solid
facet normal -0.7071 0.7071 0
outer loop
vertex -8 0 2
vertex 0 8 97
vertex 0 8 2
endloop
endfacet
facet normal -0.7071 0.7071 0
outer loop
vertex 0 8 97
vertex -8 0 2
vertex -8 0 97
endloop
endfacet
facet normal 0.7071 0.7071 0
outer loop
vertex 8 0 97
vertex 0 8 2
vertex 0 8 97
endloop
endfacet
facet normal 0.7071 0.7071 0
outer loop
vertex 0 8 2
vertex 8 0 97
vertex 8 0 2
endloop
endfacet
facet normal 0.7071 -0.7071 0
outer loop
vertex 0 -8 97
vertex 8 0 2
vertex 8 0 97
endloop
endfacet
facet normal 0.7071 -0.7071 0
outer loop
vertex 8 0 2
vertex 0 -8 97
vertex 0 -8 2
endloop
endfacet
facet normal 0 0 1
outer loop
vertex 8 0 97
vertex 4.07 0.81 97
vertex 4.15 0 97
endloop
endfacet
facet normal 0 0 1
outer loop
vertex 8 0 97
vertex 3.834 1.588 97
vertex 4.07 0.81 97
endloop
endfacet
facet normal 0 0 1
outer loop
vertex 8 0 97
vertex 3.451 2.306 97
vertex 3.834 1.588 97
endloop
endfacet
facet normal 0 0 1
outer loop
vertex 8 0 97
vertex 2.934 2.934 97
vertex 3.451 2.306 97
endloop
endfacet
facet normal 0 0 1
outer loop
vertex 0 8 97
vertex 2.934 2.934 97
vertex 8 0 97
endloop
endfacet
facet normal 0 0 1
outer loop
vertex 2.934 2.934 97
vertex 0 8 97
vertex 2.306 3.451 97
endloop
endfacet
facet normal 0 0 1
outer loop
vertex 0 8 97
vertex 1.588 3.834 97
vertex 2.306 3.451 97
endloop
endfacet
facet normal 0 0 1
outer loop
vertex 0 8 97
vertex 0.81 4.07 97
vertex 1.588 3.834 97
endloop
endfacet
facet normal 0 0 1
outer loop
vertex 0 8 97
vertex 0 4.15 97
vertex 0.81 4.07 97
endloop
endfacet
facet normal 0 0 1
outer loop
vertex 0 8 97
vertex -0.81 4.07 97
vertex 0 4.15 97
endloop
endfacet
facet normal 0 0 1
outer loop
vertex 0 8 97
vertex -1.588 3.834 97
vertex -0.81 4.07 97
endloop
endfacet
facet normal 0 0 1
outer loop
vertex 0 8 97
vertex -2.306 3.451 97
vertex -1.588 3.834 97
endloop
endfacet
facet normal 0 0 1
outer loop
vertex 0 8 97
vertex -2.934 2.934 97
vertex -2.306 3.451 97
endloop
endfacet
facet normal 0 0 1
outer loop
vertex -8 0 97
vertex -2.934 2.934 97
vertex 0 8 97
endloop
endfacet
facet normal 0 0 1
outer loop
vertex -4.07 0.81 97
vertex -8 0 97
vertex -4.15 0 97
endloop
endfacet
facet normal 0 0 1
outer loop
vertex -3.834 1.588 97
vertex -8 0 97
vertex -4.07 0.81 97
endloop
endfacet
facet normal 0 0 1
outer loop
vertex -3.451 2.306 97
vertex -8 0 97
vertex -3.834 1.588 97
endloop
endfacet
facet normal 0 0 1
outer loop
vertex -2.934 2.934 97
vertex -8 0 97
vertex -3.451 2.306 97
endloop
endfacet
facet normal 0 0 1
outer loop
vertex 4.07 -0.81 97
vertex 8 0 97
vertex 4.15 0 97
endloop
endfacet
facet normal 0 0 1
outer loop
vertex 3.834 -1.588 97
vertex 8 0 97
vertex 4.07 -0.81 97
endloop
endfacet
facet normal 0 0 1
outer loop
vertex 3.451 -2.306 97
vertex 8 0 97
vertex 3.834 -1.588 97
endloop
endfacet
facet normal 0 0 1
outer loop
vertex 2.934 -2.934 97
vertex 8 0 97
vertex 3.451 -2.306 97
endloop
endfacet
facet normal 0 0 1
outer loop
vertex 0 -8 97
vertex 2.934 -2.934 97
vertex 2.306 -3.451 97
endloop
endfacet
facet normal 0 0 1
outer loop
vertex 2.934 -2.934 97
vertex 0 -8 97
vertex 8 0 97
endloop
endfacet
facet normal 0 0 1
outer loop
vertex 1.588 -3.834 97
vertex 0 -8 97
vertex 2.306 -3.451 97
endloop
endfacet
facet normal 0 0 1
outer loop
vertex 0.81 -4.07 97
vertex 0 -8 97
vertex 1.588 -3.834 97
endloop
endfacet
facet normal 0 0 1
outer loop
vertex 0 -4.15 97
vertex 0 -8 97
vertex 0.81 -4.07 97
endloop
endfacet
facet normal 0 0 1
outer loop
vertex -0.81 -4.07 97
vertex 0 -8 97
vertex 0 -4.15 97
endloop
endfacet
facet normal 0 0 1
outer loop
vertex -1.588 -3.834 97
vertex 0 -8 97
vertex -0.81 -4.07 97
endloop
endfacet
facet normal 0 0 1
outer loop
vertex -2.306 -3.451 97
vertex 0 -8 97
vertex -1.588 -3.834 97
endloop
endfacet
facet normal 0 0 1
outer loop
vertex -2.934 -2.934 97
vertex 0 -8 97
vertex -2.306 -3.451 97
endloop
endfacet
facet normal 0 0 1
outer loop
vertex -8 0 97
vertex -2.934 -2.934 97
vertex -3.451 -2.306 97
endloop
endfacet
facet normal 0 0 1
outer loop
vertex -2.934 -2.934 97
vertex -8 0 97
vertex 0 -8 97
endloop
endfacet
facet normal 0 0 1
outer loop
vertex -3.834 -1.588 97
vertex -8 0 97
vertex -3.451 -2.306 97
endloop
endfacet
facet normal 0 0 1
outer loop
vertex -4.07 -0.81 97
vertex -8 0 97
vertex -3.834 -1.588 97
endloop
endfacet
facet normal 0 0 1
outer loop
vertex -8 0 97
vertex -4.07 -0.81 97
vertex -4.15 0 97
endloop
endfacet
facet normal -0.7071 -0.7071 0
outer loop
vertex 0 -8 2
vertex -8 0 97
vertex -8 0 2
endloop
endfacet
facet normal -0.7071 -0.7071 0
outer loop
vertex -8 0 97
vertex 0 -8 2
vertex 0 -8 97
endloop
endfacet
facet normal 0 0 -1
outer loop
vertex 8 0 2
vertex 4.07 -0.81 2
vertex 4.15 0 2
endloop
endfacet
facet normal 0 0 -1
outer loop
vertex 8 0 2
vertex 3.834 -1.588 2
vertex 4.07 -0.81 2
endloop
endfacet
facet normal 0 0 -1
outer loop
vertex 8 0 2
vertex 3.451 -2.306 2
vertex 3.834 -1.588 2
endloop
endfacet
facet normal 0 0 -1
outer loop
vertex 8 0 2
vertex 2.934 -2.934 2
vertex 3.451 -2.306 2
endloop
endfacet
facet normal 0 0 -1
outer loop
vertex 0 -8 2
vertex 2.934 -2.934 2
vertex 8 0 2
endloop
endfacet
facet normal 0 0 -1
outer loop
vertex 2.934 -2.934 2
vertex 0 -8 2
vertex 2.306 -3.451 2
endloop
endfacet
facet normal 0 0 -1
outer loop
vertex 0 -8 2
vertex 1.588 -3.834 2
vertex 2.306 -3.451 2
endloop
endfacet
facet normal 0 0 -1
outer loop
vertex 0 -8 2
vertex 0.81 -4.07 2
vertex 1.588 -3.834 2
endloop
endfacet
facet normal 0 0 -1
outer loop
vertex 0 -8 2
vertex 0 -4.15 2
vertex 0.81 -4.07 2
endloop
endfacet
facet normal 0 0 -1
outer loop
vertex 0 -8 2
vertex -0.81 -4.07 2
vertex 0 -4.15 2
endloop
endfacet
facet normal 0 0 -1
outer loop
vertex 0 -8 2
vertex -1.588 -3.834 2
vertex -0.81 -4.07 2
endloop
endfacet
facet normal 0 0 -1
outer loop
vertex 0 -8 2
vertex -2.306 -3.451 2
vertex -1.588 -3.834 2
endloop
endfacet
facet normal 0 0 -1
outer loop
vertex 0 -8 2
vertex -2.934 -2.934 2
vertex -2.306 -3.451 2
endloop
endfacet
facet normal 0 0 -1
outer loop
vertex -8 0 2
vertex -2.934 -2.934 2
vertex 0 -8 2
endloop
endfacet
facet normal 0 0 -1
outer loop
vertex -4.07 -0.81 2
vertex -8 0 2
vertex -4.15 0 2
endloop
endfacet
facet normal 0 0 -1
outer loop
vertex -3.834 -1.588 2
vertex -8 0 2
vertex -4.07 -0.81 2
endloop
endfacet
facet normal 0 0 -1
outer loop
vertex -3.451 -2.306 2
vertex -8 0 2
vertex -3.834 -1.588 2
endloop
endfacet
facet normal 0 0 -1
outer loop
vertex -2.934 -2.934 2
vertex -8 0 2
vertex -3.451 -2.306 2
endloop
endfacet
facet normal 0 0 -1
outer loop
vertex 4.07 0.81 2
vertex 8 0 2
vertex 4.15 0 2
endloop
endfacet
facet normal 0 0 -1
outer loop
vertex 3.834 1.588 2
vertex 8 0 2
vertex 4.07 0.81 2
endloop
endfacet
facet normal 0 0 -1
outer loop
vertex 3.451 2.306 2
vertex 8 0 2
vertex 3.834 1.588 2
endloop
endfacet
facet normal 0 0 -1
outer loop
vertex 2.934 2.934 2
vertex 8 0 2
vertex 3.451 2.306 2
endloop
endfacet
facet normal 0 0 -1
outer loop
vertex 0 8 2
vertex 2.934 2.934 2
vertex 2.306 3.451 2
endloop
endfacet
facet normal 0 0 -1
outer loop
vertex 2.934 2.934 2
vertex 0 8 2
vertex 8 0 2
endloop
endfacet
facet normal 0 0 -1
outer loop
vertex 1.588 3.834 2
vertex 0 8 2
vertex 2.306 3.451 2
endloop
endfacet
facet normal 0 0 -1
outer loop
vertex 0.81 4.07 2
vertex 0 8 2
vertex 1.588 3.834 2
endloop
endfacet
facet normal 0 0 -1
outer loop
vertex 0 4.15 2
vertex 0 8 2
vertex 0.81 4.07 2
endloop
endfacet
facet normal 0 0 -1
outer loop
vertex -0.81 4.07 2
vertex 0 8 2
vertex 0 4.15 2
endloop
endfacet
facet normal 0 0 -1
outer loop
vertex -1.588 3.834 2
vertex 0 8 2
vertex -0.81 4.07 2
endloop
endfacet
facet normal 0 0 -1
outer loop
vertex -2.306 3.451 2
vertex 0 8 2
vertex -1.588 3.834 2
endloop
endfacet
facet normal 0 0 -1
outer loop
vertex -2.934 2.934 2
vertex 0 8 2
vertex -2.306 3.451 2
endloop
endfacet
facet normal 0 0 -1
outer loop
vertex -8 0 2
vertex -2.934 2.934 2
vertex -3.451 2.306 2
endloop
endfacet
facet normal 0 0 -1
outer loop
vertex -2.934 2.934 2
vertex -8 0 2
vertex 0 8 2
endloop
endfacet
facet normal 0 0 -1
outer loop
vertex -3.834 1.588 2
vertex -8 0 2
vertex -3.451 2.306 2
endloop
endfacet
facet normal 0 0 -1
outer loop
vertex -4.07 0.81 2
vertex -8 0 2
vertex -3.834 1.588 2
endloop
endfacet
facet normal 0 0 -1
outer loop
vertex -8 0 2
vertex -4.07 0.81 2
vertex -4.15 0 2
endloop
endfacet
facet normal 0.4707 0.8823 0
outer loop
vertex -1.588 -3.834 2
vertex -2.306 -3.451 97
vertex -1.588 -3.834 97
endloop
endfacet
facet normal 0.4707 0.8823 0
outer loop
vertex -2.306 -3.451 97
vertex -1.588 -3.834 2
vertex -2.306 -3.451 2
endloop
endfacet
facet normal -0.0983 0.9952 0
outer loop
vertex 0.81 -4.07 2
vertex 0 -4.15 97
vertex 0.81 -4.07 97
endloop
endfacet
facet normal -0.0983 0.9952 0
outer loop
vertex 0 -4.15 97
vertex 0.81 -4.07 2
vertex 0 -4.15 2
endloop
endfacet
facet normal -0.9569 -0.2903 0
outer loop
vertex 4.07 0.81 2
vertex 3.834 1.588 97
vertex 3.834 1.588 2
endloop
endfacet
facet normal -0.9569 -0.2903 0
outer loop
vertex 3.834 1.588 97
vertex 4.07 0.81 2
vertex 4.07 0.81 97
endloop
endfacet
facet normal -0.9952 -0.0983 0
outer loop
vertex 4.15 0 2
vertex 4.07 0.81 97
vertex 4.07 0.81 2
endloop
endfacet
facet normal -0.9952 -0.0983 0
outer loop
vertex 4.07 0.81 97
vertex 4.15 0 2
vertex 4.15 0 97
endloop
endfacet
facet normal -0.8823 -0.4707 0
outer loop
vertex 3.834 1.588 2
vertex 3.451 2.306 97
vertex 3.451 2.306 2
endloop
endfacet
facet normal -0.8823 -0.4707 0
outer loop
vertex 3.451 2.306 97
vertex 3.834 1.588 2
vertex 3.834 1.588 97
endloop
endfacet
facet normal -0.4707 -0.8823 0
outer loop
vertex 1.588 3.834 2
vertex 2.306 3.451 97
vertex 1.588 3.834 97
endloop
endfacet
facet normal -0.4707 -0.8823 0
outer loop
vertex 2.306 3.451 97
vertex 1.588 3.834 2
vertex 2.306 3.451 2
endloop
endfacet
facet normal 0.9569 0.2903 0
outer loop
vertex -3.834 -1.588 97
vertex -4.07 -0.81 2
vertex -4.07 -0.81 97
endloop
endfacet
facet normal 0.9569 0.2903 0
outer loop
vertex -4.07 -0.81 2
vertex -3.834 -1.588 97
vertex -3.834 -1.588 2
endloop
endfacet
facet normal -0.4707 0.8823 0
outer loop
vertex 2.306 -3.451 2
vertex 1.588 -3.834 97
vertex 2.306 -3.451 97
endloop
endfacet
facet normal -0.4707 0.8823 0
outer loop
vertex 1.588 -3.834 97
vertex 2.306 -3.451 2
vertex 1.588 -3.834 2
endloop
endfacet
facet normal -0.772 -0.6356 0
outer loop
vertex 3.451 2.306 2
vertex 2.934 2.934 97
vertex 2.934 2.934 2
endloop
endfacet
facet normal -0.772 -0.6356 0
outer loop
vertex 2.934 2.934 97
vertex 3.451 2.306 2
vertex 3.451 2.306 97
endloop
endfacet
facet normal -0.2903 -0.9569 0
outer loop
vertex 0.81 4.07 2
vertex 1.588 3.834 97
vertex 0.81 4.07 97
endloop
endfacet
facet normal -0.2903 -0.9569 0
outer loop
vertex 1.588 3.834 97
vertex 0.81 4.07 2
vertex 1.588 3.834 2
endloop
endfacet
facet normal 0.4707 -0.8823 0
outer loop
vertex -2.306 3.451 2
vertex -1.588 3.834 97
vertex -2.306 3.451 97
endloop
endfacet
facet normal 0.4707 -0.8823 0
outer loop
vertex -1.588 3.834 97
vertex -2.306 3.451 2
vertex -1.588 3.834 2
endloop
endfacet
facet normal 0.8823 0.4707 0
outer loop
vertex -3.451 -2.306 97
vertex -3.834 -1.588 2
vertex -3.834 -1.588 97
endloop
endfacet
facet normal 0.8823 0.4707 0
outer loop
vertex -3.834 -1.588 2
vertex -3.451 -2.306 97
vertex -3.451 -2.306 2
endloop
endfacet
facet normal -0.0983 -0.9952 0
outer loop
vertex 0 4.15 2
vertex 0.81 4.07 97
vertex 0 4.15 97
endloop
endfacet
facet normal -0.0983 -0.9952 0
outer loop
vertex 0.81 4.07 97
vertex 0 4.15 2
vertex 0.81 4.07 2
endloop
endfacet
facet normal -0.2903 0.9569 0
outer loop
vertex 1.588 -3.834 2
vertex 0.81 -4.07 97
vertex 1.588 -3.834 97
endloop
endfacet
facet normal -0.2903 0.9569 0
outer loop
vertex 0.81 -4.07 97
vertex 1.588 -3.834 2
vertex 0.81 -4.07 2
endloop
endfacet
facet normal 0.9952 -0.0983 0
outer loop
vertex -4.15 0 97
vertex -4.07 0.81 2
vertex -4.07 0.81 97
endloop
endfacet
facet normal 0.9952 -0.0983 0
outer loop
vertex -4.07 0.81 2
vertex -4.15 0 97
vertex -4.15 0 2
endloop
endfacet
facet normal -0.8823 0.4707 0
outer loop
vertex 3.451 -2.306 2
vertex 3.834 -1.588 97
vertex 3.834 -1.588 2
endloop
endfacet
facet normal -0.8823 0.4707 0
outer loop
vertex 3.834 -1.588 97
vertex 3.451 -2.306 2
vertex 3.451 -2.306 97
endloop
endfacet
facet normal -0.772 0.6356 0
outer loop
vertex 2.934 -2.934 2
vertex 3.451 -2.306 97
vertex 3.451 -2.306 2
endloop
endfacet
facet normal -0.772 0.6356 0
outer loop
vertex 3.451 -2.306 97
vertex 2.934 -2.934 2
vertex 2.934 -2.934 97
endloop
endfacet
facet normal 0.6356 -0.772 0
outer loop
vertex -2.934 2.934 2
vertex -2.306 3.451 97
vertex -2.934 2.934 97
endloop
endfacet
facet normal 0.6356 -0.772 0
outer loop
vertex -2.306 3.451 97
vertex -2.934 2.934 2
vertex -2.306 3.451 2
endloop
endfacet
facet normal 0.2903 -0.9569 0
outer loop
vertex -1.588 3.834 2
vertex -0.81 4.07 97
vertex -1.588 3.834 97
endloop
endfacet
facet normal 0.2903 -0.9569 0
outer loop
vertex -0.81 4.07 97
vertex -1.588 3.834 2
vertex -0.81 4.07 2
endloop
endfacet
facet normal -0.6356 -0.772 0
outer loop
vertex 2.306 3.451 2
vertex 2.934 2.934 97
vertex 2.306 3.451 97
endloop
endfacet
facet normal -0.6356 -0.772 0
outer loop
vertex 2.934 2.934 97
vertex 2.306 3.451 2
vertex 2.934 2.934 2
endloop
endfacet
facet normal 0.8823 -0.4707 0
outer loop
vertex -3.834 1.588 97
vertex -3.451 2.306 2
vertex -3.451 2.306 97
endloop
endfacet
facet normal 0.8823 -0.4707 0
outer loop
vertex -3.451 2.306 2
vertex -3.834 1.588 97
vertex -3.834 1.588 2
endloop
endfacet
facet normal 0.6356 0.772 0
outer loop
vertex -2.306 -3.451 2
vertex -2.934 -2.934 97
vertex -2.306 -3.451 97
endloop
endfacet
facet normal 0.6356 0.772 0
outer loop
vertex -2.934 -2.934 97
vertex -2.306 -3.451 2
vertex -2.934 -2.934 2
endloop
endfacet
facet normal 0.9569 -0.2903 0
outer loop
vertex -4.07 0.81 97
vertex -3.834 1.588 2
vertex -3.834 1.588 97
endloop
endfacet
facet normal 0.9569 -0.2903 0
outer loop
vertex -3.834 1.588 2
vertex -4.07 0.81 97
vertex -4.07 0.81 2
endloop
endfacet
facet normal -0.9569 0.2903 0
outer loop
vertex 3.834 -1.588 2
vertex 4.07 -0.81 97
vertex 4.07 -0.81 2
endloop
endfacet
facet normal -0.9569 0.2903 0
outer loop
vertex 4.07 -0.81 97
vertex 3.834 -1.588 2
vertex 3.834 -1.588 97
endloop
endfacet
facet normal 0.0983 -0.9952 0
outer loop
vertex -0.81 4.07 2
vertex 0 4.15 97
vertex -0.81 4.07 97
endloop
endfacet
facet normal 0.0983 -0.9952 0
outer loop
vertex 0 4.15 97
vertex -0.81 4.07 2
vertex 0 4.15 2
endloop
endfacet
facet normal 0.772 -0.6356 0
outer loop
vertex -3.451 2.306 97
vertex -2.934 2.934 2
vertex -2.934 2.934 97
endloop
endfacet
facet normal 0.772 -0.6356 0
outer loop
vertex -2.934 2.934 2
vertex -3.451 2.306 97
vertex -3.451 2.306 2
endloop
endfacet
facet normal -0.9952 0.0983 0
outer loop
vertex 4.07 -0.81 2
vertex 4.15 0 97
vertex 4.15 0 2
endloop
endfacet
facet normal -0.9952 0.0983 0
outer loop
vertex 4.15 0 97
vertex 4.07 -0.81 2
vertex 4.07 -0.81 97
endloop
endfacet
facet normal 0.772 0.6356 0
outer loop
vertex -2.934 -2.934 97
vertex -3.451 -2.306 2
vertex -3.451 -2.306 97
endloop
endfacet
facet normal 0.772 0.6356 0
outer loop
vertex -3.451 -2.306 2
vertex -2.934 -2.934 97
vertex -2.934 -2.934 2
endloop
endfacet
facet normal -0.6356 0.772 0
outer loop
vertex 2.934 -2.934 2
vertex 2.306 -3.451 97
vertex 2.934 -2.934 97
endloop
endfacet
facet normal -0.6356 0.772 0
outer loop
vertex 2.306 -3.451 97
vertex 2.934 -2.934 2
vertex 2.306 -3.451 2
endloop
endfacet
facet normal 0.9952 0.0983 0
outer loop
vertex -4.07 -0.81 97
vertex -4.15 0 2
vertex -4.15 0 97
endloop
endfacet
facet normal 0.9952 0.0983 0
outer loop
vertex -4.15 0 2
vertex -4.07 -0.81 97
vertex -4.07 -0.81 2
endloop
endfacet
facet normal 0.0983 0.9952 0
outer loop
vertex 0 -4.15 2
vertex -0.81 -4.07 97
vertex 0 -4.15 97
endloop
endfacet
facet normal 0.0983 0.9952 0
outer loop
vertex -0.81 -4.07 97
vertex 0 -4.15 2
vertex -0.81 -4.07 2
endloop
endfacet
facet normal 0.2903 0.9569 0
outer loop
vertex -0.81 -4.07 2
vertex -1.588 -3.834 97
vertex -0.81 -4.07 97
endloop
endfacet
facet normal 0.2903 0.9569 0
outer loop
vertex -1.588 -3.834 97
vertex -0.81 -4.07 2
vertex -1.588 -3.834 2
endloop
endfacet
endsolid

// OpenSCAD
// 28BYJ-48 from RGriffoGoes 
// at http://www.thingiverse.com/thing:204734
// named and measured dimensions, and
// added details by J.Beale 21 July 2014

MBH = 18.8;   // motor body height
MBD = 28.25;  // motor body OD


SHD = 5.9;   // motor shaft OD
SHDF = 4.0;   // motor shaft diameter, across flats
SHHF = 6.0;   // motor shaft flats height, or depth in from end
SHH = 9.75;   // height of shaft above motor body 




// =========================================================
eps = 0.05;   // small number to avoid coincident faces


/*module squres() {
    color("green") translate([-(SHD+SHDF)/2,0,3]) 
    cube([SHD,SHD,15], center = true);
    color("red") translate([(SHD+SHDF)/2,0,3]) 
    cube([SHD,SHD,15], center = true);
}
*/ 

    

/*
module motor() {
difference() {
    color("blue") cylinder(h = 20, r = SHD/2, center = true, $fn = 32); 
    squres();

        }



}
*/ 

/*
module cylindertop() {
 difference() {
    translate([0,0,35])
    cylinder(h=64.9, r=4, $fn = 30); 
    translate ([0, 0, 90])
    cylinder(h=10, r=2, $fn = 30); 
    
 }
}
*/

 module stack() {   
difference(){
    translate([0,0,2])
   cylinder(h=95, r=8, $fn = 4); 
   cylinder(h=1000, r=4.15, $fn=32); 
}
}
stack();

/*
difference() {
    cylindertop();
    stack();
}	

*/		
